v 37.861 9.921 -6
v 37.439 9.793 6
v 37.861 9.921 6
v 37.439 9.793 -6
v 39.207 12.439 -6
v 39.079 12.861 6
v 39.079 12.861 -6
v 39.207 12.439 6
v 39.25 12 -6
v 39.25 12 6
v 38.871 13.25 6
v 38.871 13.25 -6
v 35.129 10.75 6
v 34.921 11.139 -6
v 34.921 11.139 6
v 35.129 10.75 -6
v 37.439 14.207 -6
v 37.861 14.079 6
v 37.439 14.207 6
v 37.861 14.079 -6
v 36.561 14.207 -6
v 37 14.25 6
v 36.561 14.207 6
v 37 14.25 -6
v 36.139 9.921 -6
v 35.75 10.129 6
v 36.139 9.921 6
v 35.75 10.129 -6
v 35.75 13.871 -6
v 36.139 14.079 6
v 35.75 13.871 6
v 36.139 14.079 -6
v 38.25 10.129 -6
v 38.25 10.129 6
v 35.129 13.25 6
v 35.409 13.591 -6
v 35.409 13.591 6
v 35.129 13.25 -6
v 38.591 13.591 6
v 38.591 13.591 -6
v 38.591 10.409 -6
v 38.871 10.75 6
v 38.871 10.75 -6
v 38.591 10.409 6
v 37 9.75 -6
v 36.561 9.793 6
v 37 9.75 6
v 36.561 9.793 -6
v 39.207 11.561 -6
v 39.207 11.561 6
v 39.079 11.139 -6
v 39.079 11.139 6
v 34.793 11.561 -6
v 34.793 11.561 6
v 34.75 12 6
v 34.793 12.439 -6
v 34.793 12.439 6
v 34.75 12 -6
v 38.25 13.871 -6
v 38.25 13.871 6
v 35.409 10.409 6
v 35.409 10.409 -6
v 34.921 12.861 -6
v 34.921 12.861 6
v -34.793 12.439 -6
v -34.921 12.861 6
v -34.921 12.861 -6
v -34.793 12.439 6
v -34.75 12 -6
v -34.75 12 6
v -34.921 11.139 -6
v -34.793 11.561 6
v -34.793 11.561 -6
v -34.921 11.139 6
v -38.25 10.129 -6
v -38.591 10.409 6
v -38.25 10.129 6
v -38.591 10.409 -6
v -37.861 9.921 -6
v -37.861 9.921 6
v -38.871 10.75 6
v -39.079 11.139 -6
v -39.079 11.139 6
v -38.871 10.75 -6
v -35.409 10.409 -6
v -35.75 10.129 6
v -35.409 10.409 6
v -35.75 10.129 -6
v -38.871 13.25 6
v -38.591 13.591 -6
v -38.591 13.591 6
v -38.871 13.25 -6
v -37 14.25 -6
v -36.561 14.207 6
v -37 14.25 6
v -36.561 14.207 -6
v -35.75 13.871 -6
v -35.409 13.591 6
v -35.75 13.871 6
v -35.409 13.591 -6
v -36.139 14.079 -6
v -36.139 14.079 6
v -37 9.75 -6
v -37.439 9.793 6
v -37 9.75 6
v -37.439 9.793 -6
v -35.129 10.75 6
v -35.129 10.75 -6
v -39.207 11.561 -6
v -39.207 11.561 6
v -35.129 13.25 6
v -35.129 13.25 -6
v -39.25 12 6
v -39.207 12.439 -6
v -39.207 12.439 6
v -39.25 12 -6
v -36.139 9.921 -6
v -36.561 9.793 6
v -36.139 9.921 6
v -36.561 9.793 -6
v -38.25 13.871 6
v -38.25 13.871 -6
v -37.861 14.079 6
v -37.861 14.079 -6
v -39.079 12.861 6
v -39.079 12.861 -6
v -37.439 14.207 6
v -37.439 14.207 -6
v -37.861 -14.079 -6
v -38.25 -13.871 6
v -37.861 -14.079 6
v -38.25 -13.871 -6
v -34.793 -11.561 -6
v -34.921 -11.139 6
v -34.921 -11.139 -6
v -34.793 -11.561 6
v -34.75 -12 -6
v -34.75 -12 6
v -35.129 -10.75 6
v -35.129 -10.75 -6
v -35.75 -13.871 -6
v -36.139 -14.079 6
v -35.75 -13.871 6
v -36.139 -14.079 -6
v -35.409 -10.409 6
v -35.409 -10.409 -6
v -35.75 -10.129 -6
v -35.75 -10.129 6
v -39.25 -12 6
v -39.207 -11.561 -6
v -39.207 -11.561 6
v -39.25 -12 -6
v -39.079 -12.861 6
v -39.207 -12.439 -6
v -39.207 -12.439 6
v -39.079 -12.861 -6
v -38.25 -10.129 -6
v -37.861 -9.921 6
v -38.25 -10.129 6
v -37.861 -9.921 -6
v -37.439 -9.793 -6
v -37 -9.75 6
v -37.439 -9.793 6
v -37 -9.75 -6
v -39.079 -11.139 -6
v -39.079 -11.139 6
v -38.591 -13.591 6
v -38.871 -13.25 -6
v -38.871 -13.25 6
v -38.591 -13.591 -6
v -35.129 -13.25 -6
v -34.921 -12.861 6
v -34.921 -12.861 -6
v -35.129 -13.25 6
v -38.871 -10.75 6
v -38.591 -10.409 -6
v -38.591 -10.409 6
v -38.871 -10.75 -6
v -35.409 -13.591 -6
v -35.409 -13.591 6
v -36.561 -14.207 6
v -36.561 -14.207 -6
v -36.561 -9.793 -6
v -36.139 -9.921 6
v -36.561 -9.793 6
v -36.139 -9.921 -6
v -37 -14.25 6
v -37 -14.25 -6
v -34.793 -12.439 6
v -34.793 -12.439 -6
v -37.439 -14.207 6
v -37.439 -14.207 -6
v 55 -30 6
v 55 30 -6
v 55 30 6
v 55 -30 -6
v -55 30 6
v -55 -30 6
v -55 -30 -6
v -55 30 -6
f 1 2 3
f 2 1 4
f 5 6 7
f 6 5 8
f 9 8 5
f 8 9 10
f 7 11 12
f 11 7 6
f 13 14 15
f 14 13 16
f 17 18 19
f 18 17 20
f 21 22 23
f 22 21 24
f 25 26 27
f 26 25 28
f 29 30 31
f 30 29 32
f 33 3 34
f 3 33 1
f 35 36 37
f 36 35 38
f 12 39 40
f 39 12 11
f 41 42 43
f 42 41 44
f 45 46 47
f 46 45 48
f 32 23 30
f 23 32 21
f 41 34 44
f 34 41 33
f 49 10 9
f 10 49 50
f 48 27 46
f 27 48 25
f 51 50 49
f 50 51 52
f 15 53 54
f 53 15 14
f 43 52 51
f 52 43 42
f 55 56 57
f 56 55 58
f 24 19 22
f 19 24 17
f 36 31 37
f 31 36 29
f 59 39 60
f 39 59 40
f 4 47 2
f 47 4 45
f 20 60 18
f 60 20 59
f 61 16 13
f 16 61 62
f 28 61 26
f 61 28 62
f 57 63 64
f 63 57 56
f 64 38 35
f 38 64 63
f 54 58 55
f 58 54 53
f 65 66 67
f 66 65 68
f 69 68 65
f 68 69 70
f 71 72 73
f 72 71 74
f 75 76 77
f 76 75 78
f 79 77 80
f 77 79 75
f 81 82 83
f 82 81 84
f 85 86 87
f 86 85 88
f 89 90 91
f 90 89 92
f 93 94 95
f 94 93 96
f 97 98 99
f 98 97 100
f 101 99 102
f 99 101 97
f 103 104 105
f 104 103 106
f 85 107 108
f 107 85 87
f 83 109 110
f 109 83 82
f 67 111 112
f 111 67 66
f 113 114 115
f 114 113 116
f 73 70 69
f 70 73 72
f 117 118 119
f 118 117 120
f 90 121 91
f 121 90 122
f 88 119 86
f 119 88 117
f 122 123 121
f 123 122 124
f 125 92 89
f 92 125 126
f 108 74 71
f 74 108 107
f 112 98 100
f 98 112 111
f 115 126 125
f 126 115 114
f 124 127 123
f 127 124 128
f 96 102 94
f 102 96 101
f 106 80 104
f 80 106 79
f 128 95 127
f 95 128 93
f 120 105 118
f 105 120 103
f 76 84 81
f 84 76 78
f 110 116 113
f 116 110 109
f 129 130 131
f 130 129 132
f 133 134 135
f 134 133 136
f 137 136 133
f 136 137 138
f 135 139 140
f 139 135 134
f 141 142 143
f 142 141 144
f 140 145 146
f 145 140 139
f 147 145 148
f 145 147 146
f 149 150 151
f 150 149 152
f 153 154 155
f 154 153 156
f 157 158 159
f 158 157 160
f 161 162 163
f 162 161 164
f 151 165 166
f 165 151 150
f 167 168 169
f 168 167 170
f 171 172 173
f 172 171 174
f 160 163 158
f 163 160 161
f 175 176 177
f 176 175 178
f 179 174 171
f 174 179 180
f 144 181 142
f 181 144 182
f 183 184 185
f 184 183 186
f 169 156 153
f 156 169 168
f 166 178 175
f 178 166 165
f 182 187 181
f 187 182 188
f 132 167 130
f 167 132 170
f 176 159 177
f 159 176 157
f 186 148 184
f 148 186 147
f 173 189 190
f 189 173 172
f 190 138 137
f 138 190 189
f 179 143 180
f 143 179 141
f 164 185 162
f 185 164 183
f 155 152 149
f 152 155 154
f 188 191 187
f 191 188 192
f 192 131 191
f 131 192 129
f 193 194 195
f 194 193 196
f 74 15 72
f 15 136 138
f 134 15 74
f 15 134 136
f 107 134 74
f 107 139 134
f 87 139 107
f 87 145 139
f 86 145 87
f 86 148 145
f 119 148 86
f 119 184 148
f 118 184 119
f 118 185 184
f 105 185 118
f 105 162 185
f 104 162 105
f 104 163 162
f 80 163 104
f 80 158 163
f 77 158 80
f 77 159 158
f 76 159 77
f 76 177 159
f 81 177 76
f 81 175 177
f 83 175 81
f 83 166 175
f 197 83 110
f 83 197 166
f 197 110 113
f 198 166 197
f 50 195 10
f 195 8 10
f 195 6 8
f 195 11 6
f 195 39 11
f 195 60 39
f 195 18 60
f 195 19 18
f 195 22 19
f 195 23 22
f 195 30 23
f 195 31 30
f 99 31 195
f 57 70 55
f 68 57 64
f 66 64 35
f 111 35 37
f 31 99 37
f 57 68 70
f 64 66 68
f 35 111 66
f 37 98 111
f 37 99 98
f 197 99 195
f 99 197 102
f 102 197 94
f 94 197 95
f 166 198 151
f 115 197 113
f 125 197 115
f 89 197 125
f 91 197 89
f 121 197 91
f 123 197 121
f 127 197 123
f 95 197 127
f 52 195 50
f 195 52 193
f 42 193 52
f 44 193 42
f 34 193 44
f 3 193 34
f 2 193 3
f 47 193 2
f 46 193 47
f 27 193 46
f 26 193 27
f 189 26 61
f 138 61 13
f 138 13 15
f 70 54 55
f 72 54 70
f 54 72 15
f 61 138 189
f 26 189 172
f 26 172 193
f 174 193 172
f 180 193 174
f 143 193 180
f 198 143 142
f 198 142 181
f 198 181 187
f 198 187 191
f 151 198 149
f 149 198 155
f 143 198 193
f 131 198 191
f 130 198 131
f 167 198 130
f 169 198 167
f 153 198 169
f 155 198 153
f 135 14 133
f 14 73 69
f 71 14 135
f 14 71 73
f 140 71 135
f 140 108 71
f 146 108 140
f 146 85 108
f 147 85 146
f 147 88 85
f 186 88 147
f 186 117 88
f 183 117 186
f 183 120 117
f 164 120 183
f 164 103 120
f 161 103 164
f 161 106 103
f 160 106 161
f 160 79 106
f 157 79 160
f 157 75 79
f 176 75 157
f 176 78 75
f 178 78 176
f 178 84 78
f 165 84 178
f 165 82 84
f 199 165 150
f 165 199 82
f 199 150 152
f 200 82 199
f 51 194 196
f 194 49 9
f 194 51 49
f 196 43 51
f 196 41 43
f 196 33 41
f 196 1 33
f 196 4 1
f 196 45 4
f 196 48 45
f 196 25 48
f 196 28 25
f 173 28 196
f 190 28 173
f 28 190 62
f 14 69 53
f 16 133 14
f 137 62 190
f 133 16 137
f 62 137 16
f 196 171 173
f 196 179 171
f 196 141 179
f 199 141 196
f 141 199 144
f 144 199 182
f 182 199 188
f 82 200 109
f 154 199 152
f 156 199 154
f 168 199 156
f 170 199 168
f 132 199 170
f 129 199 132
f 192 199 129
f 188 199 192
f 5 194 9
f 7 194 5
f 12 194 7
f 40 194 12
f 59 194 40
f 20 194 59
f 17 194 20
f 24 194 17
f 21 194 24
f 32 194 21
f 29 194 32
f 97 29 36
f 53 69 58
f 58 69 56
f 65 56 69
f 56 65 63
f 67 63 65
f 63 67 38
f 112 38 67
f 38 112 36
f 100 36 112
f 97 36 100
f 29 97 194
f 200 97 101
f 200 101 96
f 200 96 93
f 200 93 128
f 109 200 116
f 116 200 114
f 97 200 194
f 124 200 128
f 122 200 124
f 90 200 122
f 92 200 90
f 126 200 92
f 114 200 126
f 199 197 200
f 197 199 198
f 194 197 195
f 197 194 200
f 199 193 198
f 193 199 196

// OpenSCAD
$fn = 32;

// ----------------------------------------------------------------------
// Corner plate 110 x 60 x 12
// 3 holes, centres taken from the edge offset
// ----------------------------------------------------------------------

// --- parameters (mm) ---
plate = [110, 60, 12];  // overall size (x, y, z)
holes = 3;              // number of holes the drawing asks for
hole_d = 4.5;           // hole diameter
edge = 18;              // hole centre offset from the plate edge

// --- derived feature positions (mm) ---
corner_x = plate[0] / 2 - edge;  // = 37   corner hole X
corner_y = plate[1] / 2 - edge;  // = 12   corner hole Y
feature_centers = [
  [corner_x, corner_y],
  [-corner_x, corner_y],
  [-corner_x, -corner_y]
];   // hole centres the loop below drills

// plate outline, every hole drilled through with the same cutters
difference() {
  cube(plate, center = true);
  for (centre = feature_centers)
    translate([centre[0], centre[1], 0])
      cylinder(d = hole_d, h = plate[2] + 2, center = true);
}
